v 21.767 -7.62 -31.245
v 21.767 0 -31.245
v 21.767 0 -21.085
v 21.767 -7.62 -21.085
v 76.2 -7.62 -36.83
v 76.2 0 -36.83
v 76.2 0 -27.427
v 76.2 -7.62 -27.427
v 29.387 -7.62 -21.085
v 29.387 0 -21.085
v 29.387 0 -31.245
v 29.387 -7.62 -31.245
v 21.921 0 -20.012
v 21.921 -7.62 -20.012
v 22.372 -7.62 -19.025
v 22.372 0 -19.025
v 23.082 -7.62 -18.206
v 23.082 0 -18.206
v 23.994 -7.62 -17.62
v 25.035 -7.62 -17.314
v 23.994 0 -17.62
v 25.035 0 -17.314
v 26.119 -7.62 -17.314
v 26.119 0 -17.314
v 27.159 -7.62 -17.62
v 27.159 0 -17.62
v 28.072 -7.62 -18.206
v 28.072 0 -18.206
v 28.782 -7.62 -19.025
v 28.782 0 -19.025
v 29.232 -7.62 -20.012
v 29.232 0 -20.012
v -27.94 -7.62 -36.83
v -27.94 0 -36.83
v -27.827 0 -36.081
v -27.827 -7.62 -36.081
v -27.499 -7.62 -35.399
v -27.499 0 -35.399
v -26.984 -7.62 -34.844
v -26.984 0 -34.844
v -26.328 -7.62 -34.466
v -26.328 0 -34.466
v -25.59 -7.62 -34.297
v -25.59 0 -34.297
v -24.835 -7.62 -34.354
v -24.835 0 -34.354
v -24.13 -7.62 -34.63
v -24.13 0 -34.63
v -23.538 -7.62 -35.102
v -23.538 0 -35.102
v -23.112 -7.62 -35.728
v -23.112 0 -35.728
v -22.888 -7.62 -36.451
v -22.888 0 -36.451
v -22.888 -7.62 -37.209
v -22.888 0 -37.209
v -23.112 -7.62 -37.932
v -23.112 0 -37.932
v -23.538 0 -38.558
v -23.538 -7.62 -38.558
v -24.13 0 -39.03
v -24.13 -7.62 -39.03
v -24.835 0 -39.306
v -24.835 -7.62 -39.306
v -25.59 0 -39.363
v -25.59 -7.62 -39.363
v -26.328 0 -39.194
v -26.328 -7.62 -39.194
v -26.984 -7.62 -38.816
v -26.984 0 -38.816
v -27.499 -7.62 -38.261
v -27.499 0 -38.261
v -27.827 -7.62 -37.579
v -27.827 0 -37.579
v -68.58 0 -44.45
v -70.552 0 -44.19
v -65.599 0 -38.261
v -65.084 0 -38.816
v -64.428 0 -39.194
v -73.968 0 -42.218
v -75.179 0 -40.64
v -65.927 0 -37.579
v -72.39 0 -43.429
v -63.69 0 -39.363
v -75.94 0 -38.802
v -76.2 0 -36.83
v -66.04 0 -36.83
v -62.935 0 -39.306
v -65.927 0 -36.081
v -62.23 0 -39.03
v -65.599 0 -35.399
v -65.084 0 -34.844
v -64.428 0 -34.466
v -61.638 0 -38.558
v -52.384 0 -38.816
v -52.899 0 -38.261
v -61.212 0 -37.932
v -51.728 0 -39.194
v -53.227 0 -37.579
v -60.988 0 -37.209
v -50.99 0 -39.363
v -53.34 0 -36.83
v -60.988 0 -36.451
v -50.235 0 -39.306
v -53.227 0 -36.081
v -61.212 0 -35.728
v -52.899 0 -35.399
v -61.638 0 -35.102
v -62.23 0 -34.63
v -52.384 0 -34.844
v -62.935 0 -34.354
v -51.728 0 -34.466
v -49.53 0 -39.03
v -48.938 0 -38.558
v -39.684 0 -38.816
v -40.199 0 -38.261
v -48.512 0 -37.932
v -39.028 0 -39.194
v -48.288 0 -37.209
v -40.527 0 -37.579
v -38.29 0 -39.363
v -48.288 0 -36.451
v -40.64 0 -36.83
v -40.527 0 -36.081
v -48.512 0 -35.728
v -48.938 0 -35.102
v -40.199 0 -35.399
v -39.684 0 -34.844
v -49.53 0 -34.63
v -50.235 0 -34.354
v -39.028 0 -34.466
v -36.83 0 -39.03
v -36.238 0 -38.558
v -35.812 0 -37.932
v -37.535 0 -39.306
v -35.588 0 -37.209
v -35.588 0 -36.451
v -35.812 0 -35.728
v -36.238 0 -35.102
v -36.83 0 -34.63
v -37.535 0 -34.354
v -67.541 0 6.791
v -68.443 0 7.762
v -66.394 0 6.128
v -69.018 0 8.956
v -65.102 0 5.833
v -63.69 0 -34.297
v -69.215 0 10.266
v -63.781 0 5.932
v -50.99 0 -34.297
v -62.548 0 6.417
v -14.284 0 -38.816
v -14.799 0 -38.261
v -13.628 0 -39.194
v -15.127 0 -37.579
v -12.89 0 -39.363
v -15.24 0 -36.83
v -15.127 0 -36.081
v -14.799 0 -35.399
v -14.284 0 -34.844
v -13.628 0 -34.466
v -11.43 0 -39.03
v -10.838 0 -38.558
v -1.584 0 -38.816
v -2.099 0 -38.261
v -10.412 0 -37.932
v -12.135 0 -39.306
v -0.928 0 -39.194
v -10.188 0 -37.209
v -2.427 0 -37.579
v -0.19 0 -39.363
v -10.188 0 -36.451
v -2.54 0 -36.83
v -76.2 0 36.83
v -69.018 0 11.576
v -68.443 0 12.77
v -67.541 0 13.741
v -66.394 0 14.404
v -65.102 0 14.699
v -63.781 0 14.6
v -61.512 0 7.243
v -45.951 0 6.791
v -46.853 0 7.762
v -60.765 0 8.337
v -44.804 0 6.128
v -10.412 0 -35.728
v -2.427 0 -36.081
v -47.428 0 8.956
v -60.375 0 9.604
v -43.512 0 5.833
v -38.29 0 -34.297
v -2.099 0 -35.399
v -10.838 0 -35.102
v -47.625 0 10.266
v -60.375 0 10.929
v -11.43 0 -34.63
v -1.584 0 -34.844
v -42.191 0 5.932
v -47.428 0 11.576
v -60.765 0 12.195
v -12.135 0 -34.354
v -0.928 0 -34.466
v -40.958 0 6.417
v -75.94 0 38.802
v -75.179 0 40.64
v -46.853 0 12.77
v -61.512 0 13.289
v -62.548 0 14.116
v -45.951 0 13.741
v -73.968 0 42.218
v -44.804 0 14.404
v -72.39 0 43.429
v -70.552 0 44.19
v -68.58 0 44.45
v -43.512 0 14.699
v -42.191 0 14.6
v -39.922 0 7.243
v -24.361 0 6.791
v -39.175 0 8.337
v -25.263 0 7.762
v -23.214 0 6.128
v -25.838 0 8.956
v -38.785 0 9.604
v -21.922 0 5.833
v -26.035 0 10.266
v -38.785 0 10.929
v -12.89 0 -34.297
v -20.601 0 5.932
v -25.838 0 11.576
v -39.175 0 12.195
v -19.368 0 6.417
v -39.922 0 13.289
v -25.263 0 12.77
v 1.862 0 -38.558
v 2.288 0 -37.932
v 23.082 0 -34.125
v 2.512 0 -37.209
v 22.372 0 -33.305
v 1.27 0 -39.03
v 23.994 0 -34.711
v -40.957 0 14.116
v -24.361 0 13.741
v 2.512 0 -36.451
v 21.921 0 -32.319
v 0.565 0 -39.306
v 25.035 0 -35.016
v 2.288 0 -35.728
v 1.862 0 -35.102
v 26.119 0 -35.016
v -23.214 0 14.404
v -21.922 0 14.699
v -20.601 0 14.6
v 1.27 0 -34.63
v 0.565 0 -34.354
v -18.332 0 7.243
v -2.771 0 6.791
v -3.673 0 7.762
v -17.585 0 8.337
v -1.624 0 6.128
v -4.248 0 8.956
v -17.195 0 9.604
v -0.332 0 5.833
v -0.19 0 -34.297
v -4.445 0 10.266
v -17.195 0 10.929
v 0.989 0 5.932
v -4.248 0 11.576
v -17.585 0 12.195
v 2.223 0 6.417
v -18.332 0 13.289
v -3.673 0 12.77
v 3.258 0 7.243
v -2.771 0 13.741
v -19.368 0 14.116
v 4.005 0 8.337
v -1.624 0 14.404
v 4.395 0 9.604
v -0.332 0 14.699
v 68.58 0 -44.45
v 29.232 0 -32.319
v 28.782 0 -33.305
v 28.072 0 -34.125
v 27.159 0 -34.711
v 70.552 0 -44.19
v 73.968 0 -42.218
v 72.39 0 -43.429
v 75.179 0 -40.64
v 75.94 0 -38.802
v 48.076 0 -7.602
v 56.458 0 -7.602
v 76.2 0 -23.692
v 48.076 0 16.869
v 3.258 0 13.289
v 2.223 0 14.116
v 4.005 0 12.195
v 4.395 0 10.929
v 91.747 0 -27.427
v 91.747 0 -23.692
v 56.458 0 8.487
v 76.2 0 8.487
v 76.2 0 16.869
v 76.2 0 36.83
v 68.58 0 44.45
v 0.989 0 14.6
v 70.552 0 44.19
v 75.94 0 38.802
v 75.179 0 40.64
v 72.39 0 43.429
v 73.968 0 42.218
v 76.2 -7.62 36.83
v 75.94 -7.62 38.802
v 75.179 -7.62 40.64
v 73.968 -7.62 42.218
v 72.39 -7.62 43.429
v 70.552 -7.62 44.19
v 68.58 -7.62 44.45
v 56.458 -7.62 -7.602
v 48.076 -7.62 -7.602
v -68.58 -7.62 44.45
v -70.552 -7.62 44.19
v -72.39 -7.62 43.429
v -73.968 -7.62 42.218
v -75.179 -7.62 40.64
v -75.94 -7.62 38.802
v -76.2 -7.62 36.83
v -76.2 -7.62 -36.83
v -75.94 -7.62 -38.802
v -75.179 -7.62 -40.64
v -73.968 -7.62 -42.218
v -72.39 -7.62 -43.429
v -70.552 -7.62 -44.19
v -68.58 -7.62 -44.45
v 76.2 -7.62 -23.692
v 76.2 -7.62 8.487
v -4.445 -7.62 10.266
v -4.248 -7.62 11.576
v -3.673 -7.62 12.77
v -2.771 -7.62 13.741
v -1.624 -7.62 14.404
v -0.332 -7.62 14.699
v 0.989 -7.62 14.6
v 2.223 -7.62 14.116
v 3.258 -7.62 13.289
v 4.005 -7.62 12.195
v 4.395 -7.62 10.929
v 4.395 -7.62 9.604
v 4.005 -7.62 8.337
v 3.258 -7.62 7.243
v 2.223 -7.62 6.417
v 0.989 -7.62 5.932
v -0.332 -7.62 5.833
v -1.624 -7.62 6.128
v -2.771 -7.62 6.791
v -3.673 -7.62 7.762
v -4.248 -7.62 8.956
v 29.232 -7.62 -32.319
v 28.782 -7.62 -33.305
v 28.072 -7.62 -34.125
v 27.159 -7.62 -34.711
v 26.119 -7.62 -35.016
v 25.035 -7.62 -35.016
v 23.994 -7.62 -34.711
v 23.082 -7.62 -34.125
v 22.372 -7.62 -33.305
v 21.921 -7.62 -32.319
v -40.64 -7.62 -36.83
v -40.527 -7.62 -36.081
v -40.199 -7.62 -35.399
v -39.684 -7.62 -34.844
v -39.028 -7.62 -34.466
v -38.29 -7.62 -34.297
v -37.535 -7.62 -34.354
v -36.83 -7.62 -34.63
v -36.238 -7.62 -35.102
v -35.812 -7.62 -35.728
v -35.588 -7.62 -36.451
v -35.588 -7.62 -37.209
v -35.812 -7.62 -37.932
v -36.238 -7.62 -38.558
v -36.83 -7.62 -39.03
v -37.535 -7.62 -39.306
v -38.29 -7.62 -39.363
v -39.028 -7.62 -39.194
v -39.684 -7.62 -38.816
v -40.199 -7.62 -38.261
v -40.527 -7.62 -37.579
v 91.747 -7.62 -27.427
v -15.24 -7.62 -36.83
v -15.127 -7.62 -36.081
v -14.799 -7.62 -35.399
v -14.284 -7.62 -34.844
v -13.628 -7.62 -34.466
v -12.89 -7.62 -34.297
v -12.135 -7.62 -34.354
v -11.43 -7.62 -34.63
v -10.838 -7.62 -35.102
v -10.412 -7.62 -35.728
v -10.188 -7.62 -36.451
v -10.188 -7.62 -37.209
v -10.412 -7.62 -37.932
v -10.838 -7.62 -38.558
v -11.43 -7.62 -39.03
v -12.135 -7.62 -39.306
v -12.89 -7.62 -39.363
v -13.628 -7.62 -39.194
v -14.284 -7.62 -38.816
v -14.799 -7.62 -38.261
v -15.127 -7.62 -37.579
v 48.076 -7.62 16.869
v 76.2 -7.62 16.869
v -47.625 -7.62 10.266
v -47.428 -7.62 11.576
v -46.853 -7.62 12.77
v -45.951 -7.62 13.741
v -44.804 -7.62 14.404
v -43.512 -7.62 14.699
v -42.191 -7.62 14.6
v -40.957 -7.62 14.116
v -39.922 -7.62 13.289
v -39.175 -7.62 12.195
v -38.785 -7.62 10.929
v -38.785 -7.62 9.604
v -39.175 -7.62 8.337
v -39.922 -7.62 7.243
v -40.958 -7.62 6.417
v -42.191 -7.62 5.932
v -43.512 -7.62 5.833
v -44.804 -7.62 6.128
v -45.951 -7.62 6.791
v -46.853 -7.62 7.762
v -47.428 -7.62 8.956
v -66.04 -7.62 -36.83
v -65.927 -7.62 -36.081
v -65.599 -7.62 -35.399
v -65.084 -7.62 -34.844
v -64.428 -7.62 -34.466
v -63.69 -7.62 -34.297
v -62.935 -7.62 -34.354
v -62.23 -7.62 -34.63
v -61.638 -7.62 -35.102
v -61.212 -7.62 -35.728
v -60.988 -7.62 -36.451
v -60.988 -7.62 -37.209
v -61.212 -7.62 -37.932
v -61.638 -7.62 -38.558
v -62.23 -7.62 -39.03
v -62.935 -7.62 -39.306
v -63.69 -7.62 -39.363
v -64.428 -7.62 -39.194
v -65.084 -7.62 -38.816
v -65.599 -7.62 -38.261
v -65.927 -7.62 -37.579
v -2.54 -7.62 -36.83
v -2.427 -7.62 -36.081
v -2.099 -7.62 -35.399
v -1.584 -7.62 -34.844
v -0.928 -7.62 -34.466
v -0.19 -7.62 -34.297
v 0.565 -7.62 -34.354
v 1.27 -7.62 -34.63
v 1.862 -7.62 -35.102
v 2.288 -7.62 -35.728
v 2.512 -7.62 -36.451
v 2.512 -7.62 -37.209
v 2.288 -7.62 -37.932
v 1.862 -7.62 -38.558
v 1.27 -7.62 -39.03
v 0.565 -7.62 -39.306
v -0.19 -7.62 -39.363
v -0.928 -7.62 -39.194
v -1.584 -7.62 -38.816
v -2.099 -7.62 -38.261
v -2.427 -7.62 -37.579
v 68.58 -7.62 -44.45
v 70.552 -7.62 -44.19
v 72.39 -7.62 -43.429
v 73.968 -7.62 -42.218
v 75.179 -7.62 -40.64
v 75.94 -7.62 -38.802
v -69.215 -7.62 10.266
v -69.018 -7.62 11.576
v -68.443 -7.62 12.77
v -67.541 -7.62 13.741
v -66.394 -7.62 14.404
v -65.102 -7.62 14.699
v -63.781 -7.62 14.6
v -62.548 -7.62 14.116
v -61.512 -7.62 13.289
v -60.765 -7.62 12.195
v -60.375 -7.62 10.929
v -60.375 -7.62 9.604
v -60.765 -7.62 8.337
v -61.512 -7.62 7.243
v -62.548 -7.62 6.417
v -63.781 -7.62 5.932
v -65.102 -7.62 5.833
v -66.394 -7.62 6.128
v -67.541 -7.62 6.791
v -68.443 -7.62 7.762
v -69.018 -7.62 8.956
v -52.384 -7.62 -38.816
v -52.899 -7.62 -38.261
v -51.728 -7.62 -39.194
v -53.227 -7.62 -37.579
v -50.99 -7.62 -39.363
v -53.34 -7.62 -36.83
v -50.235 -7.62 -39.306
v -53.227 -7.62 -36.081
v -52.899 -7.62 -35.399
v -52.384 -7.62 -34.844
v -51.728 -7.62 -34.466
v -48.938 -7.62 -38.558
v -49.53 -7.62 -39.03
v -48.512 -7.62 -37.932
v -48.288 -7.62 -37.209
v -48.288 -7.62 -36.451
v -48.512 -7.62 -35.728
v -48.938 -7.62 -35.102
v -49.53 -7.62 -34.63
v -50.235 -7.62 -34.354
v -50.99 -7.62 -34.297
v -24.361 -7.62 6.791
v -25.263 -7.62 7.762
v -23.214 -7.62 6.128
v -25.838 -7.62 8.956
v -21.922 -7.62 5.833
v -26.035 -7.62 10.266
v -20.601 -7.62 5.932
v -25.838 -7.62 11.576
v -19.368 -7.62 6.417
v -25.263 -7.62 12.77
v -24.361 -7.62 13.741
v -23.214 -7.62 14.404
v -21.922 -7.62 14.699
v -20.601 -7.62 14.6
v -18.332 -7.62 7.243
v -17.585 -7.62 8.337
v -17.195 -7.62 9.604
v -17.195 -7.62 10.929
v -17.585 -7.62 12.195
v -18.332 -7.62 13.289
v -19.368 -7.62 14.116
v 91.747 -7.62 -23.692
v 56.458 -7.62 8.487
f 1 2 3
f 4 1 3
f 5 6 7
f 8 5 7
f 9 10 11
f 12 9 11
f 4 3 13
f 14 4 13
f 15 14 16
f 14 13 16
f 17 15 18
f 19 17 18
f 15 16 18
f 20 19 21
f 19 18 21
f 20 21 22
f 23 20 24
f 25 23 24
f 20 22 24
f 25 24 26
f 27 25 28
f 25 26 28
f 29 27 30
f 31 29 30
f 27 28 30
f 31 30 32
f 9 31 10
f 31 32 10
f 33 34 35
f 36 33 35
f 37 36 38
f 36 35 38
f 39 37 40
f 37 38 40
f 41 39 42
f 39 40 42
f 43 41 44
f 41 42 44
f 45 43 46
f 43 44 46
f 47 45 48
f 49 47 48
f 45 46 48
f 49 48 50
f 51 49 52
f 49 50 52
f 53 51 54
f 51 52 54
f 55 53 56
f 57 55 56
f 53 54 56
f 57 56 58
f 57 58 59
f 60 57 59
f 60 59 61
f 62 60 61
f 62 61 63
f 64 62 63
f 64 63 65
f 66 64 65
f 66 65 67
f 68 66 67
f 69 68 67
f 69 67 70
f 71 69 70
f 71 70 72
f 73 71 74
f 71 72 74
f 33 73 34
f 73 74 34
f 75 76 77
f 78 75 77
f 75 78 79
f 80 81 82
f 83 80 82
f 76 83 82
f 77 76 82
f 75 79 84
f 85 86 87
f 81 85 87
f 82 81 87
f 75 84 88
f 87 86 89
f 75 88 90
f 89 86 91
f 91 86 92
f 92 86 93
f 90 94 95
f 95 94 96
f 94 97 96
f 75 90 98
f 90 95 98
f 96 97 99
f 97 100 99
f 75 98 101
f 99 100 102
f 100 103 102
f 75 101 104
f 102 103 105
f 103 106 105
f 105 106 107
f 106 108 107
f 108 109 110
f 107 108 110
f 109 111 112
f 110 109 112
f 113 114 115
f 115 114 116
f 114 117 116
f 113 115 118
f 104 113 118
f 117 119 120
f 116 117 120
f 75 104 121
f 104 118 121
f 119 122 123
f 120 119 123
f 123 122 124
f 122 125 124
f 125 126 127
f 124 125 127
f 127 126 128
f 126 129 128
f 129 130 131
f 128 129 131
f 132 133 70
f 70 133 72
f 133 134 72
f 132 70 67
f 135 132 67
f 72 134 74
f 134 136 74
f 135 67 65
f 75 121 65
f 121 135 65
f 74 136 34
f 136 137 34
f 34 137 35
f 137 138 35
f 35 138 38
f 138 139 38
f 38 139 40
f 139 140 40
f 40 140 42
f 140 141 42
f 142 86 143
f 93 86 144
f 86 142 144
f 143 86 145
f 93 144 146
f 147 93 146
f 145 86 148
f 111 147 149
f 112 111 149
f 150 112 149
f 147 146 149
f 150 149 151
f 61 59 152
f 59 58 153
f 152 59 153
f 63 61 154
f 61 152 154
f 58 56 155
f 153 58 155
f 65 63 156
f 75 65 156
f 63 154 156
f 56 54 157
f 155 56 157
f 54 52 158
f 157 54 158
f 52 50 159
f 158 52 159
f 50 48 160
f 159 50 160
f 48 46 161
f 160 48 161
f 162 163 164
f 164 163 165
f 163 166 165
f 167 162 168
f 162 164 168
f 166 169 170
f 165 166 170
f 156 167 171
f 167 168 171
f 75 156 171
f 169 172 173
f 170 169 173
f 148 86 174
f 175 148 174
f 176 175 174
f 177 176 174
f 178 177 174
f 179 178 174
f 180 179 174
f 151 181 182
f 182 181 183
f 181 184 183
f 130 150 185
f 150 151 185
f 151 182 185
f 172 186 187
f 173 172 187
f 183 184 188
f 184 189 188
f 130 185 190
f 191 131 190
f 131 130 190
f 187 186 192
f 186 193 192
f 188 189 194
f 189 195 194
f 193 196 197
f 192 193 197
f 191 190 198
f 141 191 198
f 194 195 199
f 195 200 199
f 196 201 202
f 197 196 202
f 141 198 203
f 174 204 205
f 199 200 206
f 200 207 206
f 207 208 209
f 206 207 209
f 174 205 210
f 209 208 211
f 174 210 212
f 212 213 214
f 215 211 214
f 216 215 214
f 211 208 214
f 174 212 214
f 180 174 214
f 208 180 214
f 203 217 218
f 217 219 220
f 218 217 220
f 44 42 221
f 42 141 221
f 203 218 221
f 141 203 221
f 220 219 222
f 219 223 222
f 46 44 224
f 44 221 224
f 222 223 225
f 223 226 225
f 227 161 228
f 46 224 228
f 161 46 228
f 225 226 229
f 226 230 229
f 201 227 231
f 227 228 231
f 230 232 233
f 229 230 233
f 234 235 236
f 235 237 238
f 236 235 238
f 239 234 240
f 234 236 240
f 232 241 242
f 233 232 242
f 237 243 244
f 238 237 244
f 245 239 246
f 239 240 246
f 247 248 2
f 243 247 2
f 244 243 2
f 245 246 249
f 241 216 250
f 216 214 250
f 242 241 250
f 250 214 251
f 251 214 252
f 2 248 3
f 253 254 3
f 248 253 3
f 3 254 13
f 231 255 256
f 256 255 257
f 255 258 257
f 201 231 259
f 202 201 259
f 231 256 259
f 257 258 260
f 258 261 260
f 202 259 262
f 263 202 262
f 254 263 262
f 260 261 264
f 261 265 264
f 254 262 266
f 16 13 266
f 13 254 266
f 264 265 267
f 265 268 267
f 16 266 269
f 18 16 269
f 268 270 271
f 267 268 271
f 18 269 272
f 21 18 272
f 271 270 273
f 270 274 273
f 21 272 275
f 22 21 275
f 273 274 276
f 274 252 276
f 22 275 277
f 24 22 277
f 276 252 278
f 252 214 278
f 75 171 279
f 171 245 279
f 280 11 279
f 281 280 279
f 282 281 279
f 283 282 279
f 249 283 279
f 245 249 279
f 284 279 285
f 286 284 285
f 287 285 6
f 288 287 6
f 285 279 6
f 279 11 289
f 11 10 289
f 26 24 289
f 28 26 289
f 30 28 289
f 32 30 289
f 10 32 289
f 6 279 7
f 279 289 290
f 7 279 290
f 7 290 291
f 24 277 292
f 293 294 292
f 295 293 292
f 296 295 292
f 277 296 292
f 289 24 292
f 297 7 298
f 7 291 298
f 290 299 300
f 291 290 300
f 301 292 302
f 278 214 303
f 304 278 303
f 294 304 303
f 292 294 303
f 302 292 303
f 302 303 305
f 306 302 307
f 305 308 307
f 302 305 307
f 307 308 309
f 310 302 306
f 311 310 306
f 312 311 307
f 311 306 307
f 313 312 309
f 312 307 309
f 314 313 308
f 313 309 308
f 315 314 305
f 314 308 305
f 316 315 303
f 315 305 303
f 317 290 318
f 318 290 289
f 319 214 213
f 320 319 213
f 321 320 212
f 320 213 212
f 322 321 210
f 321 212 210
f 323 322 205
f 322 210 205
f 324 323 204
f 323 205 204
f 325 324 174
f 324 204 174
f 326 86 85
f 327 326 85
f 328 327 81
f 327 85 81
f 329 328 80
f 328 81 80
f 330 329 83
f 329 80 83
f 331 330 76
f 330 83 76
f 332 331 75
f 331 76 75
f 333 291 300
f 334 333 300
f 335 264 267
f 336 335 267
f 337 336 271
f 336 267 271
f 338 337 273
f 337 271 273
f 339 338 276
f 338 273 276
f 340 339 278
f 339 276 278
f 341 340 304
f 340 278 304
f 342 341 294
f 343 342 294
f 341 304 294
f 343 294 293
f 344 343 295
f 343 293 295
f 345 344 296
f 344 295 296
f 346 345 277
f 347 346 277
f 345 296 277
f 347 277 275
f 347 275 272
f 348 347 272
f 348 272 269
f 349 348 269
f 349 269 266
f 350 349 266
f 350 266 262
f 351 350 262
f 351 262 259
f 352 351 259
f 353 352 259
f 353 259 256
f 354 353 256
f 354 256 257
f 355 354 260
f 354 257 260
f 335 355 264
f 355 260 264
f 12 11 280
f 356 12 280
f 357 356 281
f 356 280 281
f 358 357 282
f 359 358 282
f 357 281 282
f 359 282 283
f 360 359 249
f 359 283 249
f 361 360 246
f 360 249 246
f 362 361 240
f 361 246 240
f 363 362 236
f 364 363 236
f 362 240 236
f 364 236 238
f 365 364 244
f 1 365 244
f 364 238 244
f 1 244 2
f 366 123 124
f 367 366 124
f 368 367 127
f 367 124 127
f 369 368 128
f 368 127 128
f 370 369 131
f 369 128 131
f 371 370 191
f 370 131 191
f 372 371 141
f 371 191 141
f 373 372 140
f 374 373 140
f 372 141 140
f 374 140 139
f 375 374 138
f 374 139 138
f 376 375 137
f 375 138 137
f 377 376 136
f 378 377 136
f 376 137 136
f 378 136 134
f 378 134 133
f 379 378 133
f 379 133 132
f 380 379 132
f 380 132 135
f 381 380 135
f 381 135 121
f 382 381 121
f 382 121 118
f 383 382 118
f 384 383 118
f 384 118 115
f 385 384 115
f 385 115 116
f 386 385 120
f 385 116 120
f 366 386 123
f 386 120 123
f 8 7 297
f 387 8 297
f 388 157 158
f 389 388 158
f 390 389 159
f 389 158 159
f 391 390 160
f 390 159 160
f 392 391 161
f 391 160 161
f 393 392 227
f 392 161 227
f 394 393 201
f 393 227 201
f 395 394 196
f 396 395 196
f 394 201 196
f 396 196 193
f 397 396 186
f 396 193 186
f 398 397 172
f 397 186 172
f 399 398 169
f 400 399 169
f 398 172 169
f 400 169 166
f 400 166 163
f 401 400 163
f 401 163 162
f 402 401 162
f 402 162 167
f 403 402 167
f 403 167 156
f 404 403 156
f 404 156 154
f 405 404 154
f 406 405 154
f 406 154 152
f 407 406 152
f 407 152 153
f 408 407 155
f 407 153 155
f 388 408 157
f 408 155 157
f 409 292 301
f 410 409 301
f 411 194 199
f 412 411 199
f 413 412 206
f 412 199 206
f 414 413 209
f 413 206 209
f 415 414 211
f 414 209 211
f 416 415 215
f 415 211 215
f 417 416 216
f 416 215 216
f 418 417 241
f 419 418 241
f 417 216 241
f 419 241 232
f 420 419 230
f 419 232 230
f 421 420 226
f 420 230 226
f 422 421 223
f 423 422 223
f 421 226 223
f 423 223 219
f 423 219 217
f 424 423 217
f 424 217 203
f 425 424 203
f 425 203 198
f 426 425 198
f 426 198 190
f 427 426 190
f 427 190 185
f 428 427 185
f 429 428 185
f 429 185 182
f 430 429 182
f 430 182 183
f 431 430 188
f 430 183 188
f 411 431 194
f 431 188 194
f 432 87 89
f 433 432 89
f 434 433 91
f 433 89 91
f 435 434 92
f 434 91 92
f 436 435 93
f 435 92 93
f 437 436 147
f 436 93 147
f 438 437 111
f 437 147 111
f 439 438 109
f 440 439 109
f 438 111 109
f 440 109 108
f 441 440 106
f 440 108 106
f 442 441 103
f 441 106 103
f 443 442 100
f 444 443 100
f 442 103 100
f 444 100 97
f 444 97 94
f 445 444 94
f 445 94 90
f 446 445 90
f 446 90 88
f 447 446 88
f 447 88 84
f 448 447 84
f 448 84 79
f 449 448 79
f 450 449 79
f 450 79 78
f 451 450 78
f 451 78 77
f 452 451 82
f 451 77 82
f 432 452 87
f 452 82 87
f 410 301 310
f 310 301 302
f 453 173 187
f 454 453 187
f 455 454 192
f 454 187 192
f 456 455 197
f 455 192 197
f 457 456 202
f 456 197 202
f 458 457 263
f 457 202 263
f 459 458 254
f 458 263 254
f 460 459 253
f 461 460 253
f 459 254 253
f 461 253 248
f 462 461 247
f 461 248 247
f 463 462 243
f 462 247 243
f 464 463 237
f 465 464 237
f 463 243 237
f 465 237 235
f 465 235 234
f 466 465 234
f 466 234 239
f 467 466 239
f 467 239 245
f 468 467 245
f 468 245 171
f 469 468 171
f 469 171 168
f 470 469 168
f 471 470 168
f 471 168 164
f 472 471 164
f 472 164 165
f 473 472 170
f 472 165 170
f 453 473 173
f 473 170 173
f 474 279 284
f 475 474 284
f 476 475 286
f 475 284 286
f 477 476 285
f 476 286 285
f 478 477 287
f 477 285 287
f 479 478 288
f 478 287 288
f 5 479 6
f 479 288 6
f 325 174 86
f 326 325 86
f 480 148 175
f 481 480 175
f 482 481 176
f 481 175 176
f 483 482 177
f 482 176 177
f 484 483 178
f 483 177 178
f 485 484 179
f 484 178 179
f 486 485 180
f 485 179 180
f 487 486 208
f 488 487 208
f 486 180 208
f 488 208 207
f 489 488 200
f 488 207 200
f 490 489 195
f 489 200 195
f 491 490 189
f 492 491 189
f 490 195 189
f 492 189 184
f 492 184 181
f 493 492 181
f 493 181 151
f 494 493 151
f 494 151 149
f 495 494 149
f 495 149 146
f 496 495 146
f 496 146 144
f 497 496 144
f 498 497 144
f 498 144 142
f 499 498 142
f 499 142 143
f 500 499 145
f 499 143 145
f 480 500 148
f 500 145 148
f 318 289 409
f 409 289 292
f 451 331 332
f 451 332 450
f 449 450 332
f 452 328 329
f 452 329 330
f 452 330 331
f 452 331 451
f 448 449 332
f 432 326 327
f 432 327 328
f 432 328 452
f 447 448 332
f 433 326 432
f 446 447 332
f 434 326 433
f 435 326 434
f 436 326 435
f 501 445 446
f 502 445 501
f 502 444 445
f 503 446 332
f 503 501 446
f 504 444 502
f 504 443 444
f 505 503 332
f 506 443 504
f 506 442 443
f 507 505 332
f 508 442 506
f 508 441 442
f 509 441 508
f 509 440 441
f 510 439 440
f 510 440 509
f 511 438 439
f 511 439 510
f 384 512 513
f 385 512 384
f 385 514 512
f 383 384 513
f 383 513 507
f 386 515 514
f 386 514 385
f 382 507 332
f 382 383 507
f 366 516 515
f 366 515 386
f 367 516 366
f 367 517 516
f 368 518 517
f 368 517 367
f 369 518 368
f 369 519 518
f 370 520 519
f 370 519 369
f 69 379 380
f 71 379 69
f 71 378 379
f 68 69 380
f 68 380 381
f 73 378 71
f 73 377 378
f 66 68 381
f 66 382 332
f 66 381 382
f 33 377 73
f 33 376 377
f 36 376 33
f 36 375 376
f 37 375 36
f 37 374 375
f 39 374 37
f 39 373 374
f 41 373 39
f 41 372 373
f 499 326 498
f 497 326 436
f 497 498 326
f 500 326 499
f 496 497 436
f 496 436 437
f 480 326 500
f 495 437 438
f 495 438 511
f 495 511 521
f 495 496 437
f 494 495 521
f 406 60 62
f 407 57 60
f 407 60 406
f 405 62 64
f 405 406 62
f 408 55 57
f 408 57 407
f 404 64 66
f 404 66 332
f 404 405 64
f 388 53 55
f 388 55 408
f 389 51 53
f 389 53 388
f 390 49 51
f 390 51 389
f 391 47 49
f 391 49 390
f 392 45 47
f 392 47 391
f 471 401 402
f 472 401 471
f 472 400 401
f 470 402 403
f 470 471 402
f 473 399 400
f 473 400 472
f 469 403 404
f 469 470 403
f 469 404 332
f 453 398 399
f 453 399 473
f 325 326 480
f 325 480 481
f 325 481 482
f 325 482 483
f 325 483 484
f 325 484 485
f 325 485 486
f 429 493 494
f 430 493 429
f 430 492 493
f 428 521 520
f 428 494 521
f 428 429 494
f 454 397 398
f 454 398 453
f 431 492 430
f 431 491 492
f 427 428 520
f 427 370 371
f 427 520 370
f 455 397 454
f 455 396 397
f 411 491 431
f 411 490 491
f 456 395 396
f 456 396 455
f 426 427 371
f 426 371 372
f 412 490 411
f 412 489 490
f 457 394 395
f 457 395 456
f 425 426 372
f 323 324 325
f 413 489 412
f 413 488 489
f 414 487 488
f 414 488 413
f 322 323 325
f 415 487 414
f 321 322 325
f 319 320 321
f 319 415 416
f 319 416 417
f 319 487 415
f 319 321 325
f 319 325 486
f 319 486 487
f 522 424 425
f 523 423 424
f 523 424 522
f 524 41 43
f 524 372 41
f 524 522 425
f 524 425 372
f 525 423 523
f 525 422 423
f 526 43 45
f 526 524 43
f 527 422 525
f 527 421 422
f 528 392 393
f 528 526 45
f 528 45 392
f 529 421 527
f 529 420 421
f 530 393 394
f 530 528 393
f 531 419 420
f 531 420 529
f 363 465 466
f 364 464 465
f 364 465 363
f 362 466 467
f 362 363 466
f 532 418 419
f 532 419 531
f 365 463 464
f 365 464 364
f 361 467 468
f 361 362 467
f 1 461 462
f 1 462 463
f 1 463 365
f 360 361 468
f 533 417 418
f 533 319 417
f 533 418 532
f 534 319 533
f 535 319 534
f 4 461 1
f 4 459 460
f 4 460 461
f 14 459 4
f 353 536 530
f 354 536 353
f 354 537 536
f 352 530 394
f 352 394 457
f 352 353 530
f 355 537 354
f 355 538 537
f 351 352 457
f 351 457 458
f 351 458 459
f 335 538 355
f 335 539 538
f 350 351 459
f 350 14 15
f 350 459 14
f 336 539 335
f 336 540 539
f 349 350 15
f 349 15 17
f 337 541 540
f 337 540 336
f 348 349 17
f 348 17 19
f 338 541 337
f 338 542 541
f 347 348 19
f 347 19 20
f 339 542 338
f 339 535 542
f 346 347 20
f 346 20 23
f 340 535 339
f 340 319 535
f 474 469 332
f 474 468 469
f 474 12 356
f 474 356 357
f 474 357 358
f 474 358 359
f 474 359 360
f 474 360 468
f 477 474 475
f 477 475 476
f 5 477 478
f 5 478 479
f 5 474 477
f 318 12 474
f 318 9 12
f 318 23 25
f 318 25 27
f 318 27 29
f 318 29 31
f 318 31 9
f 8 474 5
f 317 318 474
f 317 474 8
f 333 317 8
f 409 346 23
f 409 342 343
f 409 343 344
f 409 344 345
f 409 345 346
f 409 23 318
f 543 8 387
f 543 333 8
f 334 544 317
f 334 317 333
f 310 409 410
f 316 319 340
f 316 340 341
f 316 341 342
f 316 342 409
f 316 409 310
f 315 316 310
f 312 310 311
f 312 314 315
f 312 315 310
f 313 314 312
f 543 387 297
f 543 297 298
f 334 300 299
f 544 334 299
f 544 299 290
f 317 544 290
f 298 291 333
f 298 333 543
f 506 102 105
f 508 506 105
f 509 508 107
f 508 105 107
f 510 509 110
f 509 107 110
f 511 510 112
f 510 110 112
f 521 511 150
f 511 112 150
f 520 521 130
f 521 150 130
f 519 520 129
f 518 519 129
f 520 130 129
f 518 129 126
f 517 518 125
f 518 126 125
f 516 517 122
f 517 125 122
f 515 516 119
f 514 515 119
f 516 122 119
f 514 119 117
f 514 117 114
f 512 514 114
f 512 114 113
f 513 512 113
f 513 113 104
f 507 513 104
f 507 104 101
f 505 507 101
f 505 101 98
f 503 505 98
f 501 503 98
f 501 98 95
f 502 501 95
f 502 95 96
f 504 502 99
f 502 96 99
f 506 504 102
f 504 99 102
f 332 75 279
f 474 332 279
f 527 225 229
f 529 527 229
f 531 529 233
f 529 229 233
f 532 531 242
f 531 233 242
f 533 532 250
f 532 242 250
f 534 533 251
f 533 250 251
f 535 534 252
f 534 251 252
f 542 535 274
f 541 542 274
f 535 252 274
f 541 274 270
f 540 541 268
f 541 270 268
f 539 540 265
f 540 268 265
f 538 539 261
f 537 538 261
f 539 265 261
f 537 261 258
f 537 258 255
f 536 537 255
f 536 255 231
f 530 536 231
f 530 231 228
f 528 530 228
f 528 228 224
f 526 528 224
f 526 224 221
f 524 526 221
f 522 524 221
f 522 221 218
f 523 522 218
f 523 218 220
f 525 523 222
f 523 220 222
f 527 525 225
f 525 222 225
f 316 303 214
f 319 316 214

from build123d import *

# Parameters (mm, degrees)
F0_W     = 15.546926
F0_H     = 3.734995
F1_DEPTH = 7.62


with BuildPart() as f1:
    # F0 (on Front) → F1 (new body)
    with BuildSketch(Plane.XZ):
        with BuildLine():
            ThreePointArc((76.2, 36.83), (73.968154, 42.218154), (68.58, 44.45))
            Line((68.58, 44.45), (-68.58, 44.45))
            ThreePointArc((-68.58, 44.45), (-73.968154, 42.218154), (-76.2, 36.83))
            Line((-76.2, 36.83), (-76.2, 10.266046))
            Line((-76.2, 10.266046), (-76.2, -36.83))
            ThreePointArc((-76.2, -36.83), (-73.968154, -42.218154), (-68.58, -44.45))
            Line((-68.58, -44.45), (68.58, -44.45))
            ThreePointArc((68.58, -44.45), (73.968154, -42.218154), (76.2, -36.83))
            Line((76.2, -36.83), (76.2, -27.426558))
            Line((76.2, -27.426558), (76.2, -23.691563))
            Line((76.2, -23.691563), (76.2, 8.486843))
            Line((76.2, 8.486843), (56.458235, 8.486843))
            Line((56.458235, 8.486843), (56.458235, -7.602361))
            Line((56.458235, -7.602361), (48.076235, -7.602361))
            Line((48.076235, -7.602361), (48.076235, 8.486843))
            Line((48.076235, 8.486843), (48.076235, 16.868843))
            Line((48.076235, 16.868843), (56.458235, 16.868843))
            Line((56.458235, 16.868843), (76.2, 16.868843))
            Line((76.2, 16.868843), (76.2, 36.83))
        make_face()
        with BuildLine():
            ThreePointArc((-60.96, -36.83), (-63.5, -39.37), (-66.04, -36.83))
            ThreePointArc((-66.04, -36.83), (-63.5, -34.29), (-60.96, -36.83))
        make_face(mode=Mode.SUBTRACT)
        with BuildLine():
            ThreePointArc((-48.26, -36.83), (-50.8, -39.37), (-53.34, -36.83))
            ThreePointArc((-53.34, -36.83), (-50.8, -34.29), (-48.26, -36.83))
        make_face(mode=Mode.SUBTRACT)
        with BuildLine():
            ThreePointArc((-35.56, -36.83), (-38.1, -39.37), (-40.64, -36.83))
            ThreePointArc((-40.64, -36.83), (-38.1, -34.29), (-35.56, -36.83))
        make_face(mode=Mode.SUBTRACT)
        with BuildLine():
            ThreePointArc((-22.86, -36.83), (-25.4, -39.37), (-27.94, -36.83))
            ThreePointArc((-27.94, -36.83), (-25.4, -34.29), (-22.86, -36.83))
        make_face(mode=Mode.SUBTRACT)
        with BuildLine():
            ThreePointArc((-10.16, -36.83), (-12.7, -39.37), (-15.24, -36.83))
            ThreePointArc((-15.24, -36.83), (-12.7, -34.29), (-10.16, -36.83))
        make_face(mode=Mode.SUBTRACT)
        with BuildLine():
            ThreePointArc((2.54, -36.83), (0, -39.37), (-2.54, -36.83))
            ThreePointArc((-2.54, -36.83), (0, -34.29), (2.54, -36.83))
        make_face(mode=Mode.SUBTRACT)
        with BuildLine():
            ThreePointArc((29.386759, -31.245217), (25.576759, -35.055217), (21.766759, -31.245217))
            Line((21.766759, -31.245217), (21.766759, -21.085217))
            ThreePointArc((21.766759, -21.085217), (25.576759, -17.275217), (29.386759, -21.085217))
            Line((29.386759, -21.085217), (29.386759, -31.245217))
        make_face(mode=Mode.SUBTRACT)
        with BuildLine():
            ThreePointArc((-60.325, 10.266046), (-64.77, 5.821046), (-69.215, 10.266046))
            ThreePointArc((-69.215, 10.266046), (-64.77, 14.711046), (-60.325, 10.266046))
        make_face(mode=Mode.SUBTRACT)
        with BuildLine():
            ThreePointArc((-38.735, 10.266046), (-43.18, 5.821046), (-47.625, 10.266046))
            ThreePointArc((-47.625, 10.266046), (-43.18, 14.711046), (-38.735, 10.266046))
        make_face(mode=Mode.SUBTRACT)
        with BuildLine():
            ThreePointArc((-17.145, 10.266046), (-21.59, 5.821046), (-26.035, 10.266046))
            ThreePointArc((-26.035, 10.266046), (-21.59, 14.711046), (-17.145, 10.266046))
        make_face(mode=Mode.SUBTRACT)
        with BuildLine():
            ThreePointArc((4.445, 10.266046), (0, 5.821046), (-4.445, 10.266046))
            ThreePointArc((-4.445, 10.266046), (0, 14.711046), (4.445, 10.266046))
        make_face(mode=Mode.SUBTRACT)
        with Locations((83.973463, -25.559061)):
            Rectangle(F0_W, F0_H)
    extrude(amount=F1_DEPTH)


solid = f1.part
